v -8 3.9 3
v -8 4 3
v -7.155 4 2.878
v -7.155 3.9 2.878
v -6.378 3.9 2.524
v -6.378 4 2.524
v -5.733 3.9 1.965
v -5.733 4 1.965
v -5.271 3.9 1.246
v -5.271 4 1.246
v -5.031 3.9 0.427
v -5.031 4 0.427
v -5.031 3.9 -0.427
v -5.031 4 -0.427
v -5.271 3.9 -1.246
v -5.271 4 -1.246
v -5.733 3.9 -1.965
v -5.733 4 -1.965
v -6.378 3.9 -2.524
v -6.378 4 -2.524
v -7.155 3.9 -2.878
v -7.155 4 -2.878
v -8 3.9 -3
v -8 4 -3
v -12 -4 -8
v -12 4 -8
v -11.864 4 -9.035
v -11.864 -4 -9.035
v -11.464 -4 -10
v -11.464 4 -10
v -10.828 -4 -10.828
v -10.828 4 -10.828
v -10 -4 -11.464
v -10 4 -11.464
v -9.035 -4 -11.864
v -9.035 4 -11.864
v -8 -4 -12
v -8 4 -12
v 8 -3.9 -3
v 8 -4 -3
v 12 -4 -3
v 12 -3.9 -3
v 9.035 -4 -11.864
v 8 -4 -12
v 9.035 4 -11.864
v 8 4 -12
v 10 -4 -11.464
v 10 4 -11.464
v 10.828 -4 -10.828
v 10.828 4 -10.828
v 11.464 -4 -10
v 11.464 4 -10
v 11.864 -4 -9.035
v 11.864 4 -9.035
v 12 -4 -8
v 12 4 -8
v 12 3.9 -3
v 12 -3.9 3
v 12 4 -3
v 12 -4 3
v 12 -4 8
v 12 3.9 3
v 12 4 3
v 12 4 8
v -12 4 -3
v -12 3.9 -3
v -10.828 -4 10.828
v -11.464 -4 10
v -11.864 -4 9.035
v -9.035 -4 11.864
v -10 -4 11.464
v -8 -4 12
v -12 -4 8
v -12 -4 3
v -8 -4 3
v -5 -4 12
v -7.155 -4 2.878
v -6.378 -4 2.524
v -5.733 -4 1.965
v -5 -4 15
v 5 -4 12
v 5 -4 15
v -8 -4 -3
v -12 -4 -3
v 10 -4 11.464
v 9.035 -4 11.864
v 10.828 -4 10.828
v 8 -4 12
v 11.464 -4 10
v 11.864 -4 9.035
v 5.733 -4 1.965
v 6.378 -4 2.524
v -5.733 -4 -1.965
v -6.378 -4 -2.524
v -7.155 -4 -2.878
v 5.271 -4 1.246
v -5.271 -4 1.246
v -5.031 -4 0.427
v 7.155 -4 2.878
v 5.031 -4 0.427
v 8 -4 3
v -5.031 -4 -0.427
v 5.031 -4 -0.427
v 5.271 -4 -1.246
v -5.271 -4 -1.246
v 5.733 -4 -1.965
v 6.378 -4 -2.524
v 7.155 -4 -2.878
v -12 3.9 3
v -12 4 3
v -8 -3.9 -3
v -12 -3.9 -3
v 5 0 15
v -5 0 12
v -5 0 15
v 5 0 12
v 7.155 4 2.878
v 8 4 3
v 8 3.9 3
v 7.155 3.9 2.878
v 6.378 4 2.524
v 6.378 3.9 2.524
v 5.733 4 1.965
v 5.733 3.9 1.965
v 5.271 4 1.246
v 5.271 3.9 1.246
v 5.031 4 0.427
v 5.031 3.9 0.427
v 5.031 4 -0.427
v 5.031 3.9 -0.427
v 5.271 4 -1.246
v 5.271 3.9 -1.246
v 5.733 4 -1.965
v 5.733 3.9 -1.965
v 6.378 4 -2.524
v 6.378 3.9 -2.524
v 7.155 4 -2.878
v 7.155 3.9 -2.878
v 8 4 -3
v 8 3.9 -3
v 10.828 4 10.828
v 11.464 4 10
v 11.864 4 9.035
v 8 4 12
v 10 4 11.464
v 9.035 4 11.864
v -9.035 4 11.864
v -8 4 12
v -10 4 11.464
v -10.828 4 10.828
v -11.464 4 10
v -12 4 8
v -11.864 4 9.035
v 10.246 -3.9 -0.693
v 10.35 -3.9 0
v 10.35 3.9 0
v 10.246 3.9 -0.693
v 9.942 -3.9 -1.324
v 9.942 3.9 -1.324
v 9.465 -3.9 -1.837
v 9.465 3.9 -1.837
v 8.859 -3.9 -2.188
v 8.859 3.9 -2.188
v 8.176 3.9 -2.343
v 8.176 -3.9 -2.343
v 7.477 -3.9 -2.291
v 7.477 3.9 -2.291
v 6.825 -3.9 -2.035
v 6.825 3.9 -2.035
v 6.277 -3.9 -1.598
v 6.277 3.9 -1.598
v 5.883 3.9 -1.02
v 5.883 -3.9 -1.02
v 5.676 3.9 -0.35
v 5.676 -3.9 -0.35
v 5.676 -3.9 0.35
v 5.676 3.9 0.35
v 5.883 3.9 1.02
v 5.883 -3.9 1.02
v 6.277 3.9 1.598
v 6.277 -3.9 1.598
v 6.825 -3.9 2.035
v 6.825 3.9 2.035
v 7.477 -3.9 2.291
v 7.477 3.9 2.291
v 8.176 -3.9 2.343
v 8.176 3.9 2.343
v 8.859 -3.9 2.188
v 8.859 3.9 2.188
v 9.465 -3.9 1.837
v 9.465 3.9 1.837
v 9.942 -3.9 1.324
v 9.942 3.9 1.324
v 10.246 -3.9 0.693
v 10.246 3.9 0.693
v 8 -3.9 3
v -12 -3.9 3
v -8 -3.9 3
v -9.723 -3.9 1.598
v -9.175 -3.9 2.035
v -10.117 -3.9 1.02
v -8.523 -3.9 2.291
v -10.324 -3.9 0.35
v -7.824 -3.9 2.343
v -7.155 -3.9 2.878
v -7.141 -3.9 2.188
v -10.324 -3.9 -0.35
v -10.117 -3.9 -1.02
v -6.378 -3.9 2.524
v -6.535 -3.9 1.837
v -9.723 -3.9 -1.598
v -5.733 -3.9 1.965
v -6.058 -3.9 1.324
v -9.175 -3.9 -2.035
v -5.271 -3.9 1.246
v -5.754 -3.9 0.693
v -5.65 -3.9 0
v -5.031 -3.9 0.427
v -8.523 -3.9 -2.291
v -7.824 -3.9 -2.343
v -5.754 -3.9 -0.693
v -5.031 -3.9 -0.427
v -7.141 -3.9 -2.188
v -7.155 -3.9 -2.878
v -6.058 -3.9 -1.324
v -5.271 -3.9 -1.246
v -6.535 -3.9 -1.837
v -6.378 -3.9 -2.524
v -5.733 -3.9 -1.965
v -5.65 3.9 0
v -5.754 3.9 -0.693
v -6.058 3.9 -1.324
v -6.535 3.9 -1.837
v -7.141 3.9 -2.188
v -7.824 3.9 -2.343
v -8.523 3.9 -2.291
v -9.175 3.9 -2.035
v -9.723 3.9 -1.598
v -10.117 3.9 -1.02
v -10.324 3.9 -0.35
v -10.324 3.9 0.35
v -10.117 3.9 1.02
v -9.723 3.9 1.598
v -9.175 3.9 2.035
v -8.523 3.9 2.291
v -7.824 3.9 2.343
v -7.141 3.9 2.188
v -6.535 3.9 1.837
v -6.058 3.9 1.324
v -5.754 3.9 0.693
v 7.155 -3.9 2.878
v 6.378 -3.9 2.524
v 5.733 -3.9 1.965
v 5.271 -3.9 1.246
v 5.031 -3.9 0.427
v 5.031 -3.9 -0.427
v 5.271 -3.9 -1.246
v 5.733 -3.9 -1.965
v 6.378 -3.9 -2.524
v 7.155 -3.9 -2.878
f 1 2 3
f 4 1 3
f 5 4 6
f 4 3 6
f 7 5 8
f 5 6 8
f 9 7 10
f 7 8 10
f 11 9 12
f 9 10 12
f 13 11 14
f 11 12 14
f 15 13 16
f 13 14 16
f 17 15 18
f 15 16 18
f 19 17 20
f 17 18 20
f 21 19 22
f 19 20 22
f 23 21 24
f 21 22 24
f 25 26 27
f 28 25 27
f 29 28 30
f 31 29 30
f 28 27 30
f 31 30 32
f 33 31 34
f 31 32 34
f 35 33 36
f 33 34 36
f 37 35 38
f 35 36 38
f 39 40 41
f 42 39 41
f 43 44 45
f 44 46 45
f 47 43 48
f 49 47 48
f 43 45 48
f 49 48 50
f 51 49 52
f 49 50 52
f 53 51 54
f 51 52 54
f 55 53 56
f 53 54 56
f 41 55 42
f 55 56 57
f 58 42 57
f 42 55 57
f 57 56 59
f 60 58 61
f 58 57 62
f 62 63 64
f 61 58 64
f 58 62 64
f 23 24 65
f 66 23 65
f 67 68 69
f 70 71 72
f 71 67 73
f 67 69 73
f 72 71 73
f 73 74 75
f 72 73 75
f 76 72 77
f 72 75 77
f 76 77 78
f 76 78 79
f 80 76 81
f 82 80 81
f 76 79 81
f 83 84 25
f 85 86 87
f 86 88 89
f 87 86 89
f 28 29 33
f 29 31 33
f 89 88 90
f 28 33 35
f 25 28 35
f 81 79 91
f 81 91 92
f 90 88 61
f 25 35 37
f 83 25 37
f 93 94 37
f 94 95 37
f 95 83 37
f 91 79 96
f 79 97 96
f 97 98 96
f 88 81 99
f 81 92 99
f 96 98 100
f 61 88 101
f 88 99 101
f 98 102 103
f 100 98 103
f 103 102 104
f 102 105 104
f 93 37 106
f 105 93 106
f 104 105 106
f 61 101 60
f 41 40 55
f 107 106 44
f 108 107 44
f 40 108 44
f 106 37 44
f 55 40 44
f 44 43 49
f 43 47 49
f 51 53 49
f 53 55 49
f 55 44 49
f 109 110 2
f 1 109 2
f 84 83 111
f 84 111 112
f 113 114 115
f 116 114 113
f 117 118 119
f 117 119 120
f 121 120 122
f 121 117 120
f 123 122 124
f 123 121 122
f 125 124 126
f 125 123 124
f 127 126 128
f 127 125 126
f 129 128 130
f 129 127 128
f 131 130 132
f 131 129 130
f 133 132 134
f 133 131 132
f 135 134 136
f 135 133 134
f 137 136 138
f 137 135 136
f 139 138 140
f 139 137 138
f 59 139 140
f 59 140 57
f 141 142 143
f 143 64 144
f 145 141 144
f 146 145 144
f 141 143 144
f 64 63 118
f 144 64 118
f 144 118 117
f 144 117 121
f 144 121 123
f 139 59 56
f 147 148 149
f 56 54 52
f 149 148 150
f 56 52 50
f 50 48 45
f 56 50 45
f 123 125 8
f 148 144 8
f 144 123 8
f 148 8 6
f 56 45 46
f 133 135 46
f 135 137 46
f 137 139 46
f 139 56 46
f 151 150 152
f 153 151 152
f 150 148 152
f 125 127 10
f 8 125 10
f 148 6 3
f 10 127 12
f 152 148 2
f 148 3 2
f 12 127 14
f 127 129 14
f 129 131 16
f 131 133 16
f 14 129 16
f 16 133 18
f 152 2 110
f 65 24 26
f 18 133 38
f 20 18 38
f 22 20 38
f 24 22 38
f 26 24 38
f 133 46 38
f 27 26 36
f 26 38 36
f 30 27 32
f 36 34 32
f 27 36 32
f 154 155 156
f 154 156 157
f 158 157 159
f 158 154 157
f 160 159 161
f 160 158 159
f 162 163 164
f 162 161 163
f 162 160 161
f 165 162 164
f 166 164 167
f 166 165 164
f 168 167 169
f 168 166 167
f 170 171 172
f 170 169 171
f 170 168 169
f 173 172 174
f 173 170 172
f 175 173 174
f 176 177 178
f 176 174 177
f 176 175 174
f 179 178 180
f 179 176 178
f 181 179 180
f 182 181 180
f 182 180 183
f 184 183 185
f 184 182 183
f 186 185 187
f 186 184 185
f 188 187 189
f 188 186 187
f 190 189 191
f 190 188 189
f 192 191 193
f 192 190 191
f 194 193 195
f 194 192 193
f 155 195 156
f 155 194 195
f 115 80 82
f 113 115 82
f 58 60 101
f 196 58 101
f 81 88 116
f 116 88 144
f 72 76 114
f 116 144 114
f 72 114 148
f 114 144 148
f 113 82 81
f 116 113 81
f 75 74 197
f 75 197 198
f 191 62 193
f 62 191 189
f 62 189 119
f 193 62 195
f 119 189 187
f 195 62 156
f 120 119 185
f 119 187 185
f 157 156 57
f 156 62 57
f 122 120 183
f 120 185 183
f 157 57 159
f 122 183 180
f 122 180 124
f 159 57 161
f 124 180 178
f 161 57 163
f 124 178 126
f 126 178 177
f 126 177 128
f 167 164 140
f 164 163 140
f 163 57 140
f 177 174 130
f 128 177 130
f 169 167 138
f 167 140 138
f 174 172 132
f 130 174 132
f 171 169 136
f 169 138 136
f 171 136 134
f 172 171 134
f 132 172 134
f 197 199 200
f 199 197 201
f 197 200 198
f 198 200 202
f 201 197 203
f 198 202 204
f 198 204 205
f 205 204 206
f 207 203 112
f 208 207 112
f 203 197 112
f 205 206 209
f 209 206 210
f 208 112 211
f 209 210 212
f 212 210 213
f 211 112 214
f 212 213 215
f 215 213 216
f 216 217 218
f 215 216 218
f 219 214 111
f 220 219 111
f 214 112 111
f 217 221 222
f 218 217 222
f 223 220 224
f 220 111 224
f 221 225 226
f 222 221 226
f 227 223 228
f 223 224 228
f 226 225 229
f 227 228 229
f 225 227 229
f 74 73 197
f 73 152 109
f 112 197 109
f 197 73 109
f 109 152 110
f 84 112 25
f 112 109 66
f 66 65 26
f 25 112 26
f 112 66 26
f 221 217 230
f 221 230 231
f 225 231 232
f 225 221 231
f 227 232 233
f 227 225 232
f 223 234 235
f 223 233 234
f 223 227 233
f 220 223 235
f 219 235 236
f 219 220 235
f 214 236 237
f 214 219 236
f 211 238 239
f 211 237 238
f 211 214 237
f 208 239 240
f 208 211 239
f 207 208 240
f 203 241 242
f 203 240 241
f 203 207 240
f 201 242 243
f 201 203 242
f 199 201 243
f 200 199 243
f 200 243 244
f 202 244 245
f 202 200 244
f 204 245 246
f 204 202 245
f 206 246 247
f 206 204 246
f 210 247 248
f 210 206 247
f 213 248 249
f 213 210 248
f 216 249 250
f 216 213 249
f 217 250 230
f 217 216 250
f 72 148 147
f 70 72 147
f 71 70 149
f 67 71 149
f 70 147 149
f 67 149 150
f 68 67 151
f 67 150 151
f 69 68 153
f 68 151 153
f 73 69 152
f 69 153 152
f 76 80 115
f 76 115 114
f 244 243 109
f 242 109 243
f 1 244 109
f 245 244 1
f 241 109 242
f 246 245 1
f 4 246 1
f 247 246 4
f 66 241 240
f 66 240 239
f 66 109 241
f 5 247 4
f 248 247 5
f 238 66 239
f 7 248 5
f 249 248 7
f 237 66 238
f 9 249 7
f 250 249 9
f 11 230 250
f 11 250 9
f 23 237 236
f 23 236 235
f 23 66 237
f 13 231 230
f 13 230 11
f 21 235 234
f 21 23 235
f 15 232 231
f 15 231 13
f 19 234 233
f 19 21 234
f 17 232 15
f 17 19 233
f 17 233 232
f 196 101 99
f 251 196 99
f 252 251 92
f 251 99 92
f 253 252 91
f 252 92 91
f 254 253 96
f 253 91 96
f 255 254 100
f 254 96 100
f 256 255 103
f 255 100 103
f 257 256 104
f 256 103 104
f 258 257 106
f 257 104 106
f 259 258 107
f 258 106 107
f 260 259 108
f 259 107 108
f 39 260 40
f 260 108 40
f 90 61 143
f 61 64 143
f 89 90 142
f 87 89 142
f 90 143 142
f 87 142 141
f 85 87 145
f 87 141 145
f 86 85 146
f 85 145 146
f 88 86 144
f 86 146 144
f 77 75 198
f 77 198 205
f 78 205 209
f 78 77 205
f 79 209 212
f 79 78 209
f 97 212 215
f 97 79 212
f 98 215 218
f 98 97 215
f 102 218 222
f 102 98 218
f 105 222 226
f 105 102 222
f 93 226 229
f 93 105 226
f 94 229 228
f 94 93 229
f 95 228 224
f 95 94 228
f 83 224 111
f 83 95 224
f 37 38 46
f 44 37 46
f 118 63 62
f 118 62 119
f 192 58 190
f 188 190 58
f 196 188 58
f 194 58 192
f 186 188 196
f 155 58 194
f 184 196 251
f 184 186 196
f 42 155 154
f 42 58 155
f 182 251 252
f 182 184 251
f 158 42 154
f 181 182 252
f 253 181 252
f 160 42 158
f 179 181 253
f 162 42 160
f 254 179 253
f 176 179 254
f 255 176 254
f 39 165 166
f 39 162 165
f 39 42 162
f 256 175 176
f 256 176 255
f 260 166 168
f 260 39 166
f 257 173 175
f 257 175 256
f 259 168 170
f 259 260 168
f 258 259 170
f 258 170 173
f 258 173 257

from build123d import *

# Parameters (mm, degrees)
CROQUIS1_R              = 2.35
SALIENTE_EXTRUIR1_DEPTH = 4
SALIENTE_EXTRUIR2_START = -4
CROQUIS2_W              = 10
CROQUIS2_H              = 6
SALIENTE_EXTRUIR2_DEPTH = 4
CORTAR_EXTRUIR1_DEPTH   = 0.1


with BuildPart() as part:
    # Croquis1 → Saliente-Extruir1 (new body, symmetric)
    with BuildSketch(Plane(origin=(0, 0, 0), x_dir=(1, 0, 0), z_dir=(0, 1, 0))):
        with BuildLine():
            Line((-8, 12), (8, 12))
            ThreePointArc((8, 12), (10.828427125, 10.828427125), (12, 8))
            Line((12, 8), (12, -8))
            ThreePointArc((12, -8), (10.828427125, -10.828427125), (8, -12))
            Line((8, -12), (-8, -12))
            ThreePointArc((-8, -12), (-10.828427125, -10.828427125), (-12, -8))
            Line((-12, -8), (-12, 8))
            ThreePointArc((-12, 8), (-10.828427125, 10.828427125), (-8, 12))
        make_face()
        with Locations((-8, 0)):
            Circle(CROQUIS1_R, mode=Mode.SUBTRACT)
        with Locations((8, 0)):
            Circle(CROQUIS1_R, mode=Mode.SUBTRACT)
    extrude(amount=SALIENTE_EXTRUIR1_DEPTH, both=True)

    # Croquis2 → Saliente-Extruir2 (add)
    with BuildSketch(Plane(origin=(0, 0, 0), x_dir=(1, 0, 0), z_dir=(0, 1, 0)).offset(SALIENTE_EXTRUIR2_START)):
        with Locations((0, -12)):
            Rectangle(CROQUIS2_W, CROQUIS2_H)
    extrude(amount=SALIENTE_EXTRUIR2_DEPTH)

    # Croquis3 → Cortar-Extruir1 (cut)
    with BuildSketch(Plane(origin=(0, 4, 0), x_dir=(1, 0, 0), z_dir=(0, 1, 0))):
        with BuildLine():
            Line((-8, 3), (-16.530379626, 3))
            Line((-16.530379626, 3), (-16.530379626, -3))
            Line((-16.530379626, -3), (-8, -3))
            ThreePointArc((-8, -3), (-5, 0), (-8, 3))
        make_face()
        with BuildLine():
            Line((16.530379626, -3), (8, -3))
            ThreePointArc((8, -3), (5, 0), (8, 3))
            Line((8, 3), (16.530379626, 3))
            Line((16.530379626, 3), (16.530379626, -3))
        make_face()
    cortar_extruir1 = extrude(amount=-CORTAR_EXTRUIR1_DEPTH, mode=Mode.SUBTRACT)

    # Simetría1: Cortar-Extruir1 across plane
    add(cortar_extruir1.mirror(Plane.ZX), mode=Mode.SUBTRACT)


solid = part.part
